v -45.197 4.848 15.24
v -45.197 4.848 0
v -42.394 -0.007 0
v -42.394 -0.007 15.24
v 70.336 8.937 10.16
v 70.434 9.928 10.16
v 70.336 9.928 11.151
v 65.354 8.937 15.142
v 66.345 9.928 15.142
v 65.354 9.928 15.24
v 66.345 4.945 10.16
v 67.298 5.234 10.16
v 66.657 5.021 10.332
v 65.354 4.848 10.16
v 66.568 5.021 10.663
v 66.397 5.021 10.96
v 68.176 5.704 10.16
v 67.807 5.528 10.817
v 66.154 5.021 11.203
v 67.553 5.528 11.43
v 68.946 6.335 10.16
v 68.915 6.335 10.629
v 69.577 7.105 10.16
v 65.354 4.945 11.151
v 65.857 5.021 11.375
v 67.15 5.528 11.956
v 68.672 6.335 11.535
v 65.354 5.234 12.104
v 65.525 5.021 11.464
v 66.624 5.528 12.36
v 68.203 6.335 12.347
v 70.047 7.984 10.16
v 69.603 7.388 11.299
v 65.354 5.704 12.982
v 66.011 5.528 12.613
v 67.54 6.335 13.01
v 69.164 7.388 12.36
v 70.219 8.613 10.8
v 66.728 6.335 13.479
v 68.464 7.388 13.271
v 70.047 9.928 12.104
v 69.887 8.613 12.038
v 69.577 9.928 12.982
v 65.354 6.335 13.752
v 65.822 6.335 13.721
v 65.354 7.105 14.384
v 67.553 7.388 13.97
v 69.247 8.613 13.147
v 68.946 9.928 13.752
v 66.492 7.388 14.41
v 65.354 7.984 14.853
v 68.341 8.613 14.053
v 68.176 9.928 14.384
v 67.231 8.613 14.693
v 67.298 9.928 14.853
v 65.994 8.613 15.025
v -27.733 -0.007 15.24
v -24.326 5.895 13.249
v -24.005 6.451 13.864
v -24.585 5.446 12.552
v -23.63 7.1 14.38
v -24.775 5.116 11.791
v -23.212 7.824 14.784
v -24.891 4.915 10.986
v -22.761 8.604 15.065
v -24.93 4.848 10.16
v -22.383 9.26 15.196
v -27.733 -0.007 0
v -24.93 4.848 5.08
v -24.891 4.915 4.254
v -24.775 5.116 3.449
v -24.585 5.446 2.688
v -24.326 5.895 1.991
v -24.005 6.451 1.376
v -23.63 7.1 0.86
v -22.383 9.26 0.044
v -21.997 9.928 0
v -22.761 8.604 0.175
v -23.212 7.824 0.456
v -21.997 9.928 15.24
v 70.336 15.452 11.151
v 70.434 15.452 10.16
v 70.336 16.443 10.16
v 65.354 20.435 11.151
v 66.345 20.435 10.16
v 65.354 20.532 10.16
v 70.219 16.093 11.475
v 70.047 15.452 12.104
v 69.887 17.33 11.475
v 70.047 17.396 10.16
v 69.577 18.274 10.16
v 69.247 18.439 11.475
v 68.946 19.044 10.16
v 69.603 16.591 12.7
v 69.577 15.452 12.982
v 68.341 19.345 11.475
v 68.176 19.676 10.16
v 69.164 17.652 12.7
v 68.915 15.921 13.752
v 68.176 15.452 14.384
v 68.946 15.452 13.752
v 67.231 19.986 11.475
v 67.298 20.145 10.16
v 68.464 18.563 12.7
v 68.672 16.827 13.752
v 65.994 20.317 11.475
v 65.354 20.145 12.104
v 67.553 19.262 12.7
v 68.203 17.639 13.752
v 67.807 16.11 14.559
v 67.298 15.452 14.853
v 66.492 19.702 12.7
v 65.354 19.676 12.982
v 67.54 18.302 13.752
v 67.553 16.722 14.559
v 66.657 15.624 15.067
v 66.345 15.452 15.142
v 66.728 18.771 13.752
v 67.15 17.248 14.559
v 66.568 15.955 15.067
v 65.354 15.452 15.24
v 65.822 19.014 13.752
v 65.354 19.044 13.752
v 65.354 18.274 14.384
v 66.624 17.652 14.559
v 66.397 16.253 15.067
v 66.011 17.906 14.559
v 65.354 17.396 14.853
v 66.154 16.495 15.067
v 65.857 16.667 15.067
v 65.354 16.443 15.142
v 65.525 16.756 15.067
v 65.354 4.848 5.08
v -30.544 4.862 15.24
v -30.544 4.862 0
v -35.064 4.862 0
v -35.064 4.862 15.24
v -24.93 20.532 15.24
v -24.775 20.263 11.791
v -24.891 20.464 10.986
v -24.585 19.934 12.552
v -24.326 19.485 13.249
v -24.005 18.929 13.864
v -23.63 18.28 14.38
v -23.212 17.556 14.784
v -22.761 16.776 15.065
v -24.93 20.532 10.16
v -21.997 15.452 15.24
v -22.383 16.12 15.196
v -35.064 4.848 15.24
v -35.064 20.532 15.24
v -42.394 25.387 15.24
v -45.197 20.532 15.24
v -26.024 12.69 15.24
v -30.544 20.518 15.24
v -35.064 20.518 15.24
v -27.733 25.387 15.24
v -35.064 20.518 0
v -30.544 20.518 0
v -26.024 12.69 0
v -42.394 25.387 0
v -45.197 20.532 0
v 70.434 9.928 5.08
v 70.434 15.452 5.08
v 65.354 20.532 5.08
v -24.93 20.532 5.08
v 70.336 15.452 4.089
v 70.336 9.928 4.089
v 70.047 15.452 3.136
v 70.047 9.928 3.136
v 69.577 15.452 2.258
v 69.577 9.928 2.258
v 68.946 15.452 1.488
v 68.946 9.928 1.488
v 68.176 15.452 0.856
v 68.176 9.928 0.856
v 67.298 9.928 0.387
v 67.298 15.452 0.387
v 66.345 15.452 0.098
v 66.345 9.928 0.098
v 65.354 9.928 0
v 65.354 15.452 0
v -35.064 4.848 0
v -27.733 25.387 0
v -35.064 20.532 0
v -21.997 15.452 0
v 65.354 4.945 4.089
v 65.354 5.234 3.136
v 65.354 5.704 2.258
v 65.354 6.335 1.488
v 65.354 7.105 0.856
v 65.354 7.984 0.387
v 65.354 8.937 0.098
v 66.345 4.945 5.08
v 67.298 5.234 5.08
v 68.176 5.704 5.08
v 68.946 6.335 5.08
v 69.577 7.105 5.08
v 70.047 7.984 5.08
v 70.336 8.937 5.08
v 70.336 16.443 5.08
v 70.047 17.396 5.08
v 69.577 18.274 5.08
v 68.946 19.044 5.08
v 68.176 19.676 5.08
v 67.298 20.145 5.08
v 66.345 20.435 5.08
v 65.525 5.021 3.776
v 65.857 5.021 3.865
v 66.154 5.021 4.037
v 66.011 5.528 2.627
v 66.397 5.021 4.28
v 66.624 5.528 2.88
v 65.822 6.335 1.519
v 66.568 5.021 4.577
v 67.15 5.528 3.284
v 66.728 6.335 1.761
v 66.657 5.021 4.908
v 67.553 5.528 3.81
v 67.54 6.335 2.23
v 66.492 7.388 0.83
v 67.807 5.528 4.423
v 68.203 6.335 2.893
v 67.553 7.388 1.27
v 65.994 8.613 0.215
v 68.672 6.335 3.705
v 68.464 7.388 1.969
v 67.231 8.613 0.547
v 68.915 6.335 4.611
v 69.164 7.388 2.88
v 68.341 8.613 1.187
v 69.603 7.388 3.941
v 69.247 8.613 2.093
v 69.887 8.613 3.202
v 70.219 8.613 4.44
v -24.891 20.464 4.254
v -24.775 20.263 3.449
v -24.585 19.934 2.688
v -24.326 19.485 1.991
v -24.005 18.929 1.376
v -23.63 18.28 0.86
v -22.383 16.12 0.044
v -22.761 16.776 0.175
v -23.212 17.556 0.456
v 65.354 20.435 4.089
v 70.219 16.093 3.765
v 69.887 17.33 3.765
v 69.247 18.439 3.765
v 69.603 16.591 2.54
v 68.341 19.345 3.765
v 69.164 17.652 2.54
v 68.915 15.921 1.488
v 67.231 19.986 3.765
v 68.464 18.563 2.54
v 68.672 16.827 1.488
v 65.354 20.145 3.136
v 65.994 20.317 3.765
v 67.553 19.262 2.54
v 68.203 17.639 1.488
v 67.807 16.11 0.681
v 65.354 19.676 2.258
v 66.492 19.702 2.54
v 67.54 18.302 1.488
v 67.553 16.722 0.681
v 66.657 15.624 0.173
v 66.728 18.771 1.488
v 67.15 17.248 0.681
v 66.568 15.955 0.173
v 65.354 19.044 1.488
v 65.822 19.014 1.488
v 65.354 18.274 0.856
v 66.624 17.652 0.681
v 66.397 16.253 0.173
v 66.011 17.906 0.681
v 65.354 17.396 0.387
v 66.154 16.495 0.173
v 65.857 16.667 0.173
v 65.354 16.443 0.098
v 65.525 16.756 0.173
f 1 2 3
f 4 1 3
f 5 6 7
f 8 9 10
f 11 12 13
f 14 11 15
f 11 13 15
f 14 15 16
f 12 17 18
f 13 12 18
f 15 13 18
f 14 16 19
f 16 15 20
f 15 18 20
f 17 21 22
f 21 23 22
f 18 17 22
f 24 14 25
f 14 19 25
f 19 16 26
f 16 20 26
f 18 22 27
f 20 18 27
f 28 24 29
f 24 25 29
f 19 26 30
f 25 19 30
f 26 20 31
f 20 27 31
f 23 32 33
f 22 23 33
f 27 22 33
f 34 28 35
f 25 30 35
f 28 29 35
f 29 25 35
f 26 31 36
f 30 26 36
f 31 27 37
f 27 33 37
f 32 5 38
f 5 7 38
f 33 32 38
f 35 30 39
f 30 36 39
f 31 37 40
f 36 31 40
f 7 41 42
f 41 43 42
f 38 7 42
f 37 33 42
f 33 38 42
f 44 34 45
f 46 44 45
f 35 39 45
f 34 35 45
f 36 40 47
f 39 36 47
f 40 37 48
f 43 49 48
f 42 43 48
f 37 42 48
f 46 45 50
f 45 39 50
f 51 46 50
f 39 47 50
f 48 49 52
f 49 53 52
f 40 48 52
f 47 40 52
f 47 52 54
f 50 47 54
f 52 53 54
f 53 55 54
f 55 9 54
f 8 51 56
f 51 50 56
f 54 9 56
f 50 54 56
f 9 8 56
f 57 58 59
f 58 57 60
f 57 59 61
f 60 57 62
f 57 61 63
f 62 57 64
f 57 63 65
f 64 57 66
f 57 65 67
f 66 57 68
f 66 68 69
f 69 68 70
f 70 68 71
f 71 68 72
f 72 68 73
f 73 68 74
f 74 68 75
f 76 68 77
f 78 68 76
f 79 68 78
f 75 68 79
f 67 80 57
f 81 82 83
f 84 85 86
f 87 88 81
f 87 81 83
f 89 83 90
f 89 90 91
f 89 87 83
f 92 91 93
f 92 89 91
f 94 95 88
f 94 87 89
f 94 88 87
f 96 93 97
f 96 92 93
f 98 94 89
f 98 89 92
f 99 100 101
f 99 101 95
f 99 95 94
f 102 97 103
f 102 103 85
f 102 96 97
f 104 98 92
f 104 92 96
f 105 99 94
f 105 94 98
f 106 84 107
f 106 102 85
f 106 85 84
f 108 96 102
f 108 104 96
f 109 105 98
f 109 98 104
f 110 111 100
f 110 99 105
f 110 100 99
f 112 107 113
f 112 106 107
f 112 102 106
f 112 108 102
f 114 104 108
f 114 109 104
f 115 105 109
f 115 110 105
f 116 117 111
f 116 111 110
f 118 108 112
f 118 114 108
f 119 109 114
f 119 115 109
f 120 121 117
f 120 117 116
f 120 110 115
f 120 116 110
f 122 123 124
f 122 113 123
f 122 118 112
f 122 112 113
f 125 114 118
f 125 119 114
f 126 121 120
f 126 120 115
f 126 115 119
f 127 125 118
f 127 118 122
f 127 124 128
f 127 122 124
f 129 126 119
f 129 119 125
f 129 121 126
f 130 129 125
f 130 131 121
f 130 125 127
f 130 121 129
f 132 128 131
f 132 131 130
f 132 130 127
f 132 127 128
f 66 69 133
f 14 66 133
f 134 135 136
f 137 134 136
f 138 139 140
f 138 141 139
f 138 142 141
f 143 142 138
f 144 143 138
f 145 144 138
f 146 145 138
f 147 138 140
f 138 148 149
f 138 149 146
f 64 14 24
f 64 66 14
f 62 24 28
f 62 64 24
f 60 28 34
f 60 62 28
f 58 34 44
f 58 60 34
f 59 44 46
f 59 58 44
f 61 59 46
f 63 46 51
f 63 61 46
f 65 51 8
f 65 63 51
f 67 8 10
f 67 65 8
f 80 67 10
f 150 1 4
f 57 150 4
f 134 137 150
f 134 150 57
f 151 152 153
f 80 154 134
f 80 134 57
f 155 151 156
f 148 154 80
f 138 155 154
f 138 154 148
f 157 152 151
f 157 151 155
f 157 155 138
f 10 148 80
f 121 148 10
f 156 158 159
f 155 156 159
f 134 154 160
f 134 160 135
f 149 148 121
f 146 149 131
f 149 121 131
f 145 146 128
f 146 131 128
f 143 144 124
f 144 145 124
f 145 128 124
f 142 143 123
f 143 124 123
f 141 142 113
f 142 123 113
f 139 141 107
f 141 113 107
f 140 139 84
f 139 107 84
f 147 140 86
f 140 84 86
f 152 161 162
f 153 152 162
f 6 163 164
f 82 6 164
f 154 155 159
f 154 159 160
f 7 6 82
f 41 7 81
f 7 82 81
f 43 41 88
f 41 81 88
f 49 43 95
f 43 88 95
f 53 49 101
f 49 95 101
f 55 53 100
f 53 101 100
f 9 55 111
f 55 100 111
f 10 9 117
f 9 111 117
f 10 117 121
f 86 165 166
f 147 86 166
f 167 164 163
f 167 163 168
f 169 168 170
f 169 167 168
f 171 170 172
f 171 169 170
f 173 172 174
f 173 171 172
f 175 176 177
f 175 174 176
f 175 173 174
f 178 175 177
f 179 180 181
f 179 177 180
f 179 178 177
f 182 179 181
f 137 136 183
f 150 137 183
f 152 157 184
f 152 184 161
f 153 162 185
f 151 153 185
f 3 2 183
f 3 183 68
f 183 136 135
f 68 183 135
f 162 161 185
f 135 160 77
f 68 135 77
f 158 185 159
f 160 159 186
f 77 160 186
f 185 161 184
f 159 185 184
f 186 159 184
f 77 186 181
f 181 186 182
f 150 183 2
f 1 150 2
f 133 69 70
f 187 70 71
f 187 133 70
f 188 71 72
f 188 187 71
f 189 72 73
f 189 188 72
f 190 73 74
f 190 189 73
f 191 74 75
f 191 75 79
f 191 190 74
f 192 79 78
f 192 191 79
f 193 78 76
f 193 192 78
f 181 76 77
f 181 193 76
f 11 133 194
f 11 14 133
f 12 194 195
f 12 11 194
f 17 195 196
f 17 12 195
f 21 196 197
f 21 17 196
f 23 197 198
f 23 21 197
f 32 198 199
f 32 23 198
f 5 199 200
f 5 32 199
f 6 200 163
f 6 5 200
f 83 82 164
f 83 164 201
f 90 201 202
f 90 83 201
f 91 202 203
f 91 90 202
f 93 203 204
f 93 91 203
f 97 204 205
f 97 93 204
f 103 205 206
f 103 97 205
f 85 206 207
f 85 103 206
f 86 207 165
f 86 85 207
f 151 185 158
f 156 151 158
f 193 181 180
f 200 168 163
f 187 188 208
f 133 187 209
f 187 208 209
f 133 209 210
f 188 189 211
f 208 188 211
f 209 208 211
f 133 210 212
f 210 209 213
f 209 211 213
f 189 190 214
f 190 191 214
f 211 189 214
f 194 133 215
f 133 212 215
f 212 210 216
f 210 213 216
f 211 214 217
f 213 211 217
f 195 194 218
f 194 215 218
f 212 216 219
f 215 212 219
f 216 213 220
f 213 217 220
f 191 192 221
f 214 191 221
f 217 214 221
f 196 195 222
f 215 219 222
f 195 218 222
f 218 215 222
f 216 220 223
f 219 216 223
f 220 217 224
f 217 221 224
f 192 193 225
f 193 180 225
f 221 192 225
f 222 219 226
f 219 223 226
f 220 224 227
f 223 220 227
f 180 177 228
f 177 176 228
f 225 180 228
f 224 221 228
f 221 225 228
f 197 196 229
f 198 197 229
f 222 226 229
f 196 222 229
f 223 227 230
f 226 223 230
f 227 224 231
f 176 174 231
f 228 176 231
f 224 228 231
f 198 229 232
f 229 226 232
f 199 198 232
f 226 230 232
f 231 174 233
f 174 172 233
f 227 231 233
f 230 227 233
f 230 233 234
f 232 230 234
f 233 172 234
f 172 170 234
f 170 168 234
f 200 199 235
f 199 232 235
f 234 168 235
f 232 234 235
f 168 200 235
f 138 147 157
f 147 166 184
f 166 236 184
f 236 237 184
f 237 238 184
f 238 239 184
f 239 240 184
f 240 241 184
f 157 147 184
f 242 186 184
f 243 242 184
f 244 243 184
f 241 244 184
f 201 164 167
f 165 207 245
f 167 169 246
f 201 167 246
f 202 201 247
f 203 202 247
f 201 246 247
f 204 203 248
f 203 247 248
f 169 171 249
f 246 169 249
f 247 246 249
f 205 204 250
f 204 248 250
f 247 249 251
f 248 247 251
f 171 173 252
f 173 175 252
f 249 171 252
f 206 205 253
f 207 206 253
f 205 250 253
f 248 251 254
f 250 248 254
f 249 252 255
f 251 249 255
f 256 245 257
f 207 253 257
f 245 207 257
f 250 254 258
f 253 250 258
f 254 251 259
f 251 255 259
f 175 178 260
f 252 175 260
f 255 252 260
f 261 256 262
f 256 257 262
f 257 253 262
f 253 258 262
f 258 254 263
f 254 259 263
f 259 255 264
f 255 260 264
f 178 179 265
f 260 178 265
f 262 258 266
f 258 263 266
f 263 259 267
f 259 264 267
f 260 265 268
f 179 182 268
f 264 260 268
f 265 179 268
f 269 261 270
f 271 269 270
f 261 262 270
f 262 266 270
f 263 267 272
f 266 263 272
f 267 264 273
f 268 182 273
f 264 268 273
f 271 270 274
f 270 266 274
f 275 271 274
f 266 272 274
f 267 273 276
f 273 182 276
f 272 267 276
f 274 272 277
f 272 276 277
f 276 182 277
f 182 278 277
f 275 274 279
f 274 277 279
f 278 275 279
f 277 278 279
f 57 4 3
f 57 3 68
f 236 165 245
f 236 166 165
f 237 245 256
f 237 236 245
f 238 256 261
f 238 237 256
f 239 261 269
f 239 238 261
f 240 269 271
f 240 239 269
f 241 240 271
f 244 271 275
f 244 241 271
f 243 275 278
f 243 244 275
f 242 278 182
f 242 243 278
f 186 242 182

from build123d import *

# Parameters (mm, degrees)
F1_DEPTH     = 15.24
F2_R         = 5.08
F3_R         = 5.08
F4_R         = 5.08
F5_S3_W      = 5.08
F5_S3_H      = 5.08
F5_T4_DEPTH  = 5.08
F5_T10_DEPTH = 102.9839018281


# Not quite as in the source:
# - a fillet or chamfer that OpenCascade refuses, or shapes differently, is made with other operations: its cross-section is extruded or revolved along the edge and cut away or added


with BuildPart() as f1:
    # F0 (on Top) → F1 (new body)
    with BuildSketch(Plane.XY):
        Polygon((-45.1973650922, 20.5321404808), (-35.0638359103, 20.5321404808), (-24.9303067284, 20.5321404808), (-27.7331978752, 25.3868903553), (-42.3944739453, 25.3868903553), align=None)
        Polygon((-24.9303067284, 20.5321404808), (-35.0638359103, 20.5321404808), (-35.0638359103, 20.5181515061), (-30.5441655604, 20.5181515061), (-26.0244952105, 12.6898528267), (-30.5441655604, 4.8615541473), (-35.0638359103, 4.8615541473), (-35.0638359103, 4.8475651727), (-24.9303067284, 4.8475651727), (-20.4025598402, 12.6898528267), align=None)
        Polygon((-27.7331978752, -0.0071847018), (-24.9303067284, 4.8475651727), (-35.0638359103, 4.8475651727), (-45.1973650922, 4.8475651727), (-42.3944739453, -0.0071847018), align=None)
        Polygon((70.4335950998, 20.5321404808), (-24.9303067284, 20.5321404808), (-20.4025598402, 12.6898528267), (-24.9303067284, 4.8475651727), (70.4335950998, 4.8475651727), align=None)
    extrude(amount=F1_DEPTH)

    # F2
    f2_edges = [f1.edges().sort_by_distance(p)[0] for p in [
        (70.433595, 20.53214, 7.62),
        (70.433595, 12.689853, 15.24),
    ]]
    fillet(f2_edges, radius=F2_R)

    # F3
    f3_edges = [f1.edges().sort_by_distance(p)[0] for p in [
        (70.433595, 10.149853, 0),
    ]]
    fillet(f3_edges, radius=F3_R)

    # F4
    f4_edges = [f1.edges().sort_by_distance(p)[0] for p in [
        (70.433595, 4.847565, 7.62),
    ]]
    fillet(f4_edges, radius=F4_R)

    # F5: fillet of radius 5.08 on 1 edges, made by hand


with BuildPart() as f5_tool2:
    # F5_s3 → F5_t4 (new body)
    with BuildSketch(Plane.XY.offset(10.16)):
        with Locations((67.8935950998, 17.9921404808)):
            Rectangle(F5_S3_W, F5_S3_H)
    extrude(amount=F5_T4_DEPTH)

    # F5_s5 → F5_t6 (revolve, cut)
    with BuildSketch(Plane(origin=(65.3535950998, 15.4521404808, 10.16), x_dir=(-0.7071067812, -0.7071067812, 0), z_dir=(-0.7071067812, 0.7071067812, 0))):
        with BuildLine():
            ThreePointArc((0, -5.08), (5.08, 0), (0, 5.08))
            Line((0, 5.08), (0, -5.08))
        make_face()
    revolve(axis=Axis((65.3535950998, 15.4521404808, 10.16), (0, 0, 1)), mode=Mode.SUBTRACT)


with BuildPart() as f1_1:
    add(f1.part)

    # F5_t1: cut F5_tool2
    add(f5_tool2.part, mode=Mode.SUBTRACT)


with BuildPart() as f5_tool8:
    # F5_s9 → F5_t10 (new body)
    with BuildSketch(Plane.YZ.offset(65.3535950998)):
        with BuildLine():
            ThreePointArc((15.4521404808, 15.24), (19.0442429292, 13.7521024484), (20.5321404808, 10.16))
            Line((20.5321404808, 10.16), (20.5321404808, 15.24))
            Line((20.5321404808, 15.24), (15.4521404808, 15.24))
        make_face()
    extrude(amount=-F5_T10_DEPTH)

    split(bisect_by=Plane(origin=(-9.8070524211, -5.6621043553, 0), x_dir=(0, 0, 1), z_dir=(0.8660254038, 0.5, 0)), keep=Keep.TOP)


with BuildPart() as f1_2:
    add(f1_1.part)

    # F5_t7: cut F5_tool8
    add(f5_tool8.part, mode=Mode.SUBTRACT)


solid = f1_2.part
